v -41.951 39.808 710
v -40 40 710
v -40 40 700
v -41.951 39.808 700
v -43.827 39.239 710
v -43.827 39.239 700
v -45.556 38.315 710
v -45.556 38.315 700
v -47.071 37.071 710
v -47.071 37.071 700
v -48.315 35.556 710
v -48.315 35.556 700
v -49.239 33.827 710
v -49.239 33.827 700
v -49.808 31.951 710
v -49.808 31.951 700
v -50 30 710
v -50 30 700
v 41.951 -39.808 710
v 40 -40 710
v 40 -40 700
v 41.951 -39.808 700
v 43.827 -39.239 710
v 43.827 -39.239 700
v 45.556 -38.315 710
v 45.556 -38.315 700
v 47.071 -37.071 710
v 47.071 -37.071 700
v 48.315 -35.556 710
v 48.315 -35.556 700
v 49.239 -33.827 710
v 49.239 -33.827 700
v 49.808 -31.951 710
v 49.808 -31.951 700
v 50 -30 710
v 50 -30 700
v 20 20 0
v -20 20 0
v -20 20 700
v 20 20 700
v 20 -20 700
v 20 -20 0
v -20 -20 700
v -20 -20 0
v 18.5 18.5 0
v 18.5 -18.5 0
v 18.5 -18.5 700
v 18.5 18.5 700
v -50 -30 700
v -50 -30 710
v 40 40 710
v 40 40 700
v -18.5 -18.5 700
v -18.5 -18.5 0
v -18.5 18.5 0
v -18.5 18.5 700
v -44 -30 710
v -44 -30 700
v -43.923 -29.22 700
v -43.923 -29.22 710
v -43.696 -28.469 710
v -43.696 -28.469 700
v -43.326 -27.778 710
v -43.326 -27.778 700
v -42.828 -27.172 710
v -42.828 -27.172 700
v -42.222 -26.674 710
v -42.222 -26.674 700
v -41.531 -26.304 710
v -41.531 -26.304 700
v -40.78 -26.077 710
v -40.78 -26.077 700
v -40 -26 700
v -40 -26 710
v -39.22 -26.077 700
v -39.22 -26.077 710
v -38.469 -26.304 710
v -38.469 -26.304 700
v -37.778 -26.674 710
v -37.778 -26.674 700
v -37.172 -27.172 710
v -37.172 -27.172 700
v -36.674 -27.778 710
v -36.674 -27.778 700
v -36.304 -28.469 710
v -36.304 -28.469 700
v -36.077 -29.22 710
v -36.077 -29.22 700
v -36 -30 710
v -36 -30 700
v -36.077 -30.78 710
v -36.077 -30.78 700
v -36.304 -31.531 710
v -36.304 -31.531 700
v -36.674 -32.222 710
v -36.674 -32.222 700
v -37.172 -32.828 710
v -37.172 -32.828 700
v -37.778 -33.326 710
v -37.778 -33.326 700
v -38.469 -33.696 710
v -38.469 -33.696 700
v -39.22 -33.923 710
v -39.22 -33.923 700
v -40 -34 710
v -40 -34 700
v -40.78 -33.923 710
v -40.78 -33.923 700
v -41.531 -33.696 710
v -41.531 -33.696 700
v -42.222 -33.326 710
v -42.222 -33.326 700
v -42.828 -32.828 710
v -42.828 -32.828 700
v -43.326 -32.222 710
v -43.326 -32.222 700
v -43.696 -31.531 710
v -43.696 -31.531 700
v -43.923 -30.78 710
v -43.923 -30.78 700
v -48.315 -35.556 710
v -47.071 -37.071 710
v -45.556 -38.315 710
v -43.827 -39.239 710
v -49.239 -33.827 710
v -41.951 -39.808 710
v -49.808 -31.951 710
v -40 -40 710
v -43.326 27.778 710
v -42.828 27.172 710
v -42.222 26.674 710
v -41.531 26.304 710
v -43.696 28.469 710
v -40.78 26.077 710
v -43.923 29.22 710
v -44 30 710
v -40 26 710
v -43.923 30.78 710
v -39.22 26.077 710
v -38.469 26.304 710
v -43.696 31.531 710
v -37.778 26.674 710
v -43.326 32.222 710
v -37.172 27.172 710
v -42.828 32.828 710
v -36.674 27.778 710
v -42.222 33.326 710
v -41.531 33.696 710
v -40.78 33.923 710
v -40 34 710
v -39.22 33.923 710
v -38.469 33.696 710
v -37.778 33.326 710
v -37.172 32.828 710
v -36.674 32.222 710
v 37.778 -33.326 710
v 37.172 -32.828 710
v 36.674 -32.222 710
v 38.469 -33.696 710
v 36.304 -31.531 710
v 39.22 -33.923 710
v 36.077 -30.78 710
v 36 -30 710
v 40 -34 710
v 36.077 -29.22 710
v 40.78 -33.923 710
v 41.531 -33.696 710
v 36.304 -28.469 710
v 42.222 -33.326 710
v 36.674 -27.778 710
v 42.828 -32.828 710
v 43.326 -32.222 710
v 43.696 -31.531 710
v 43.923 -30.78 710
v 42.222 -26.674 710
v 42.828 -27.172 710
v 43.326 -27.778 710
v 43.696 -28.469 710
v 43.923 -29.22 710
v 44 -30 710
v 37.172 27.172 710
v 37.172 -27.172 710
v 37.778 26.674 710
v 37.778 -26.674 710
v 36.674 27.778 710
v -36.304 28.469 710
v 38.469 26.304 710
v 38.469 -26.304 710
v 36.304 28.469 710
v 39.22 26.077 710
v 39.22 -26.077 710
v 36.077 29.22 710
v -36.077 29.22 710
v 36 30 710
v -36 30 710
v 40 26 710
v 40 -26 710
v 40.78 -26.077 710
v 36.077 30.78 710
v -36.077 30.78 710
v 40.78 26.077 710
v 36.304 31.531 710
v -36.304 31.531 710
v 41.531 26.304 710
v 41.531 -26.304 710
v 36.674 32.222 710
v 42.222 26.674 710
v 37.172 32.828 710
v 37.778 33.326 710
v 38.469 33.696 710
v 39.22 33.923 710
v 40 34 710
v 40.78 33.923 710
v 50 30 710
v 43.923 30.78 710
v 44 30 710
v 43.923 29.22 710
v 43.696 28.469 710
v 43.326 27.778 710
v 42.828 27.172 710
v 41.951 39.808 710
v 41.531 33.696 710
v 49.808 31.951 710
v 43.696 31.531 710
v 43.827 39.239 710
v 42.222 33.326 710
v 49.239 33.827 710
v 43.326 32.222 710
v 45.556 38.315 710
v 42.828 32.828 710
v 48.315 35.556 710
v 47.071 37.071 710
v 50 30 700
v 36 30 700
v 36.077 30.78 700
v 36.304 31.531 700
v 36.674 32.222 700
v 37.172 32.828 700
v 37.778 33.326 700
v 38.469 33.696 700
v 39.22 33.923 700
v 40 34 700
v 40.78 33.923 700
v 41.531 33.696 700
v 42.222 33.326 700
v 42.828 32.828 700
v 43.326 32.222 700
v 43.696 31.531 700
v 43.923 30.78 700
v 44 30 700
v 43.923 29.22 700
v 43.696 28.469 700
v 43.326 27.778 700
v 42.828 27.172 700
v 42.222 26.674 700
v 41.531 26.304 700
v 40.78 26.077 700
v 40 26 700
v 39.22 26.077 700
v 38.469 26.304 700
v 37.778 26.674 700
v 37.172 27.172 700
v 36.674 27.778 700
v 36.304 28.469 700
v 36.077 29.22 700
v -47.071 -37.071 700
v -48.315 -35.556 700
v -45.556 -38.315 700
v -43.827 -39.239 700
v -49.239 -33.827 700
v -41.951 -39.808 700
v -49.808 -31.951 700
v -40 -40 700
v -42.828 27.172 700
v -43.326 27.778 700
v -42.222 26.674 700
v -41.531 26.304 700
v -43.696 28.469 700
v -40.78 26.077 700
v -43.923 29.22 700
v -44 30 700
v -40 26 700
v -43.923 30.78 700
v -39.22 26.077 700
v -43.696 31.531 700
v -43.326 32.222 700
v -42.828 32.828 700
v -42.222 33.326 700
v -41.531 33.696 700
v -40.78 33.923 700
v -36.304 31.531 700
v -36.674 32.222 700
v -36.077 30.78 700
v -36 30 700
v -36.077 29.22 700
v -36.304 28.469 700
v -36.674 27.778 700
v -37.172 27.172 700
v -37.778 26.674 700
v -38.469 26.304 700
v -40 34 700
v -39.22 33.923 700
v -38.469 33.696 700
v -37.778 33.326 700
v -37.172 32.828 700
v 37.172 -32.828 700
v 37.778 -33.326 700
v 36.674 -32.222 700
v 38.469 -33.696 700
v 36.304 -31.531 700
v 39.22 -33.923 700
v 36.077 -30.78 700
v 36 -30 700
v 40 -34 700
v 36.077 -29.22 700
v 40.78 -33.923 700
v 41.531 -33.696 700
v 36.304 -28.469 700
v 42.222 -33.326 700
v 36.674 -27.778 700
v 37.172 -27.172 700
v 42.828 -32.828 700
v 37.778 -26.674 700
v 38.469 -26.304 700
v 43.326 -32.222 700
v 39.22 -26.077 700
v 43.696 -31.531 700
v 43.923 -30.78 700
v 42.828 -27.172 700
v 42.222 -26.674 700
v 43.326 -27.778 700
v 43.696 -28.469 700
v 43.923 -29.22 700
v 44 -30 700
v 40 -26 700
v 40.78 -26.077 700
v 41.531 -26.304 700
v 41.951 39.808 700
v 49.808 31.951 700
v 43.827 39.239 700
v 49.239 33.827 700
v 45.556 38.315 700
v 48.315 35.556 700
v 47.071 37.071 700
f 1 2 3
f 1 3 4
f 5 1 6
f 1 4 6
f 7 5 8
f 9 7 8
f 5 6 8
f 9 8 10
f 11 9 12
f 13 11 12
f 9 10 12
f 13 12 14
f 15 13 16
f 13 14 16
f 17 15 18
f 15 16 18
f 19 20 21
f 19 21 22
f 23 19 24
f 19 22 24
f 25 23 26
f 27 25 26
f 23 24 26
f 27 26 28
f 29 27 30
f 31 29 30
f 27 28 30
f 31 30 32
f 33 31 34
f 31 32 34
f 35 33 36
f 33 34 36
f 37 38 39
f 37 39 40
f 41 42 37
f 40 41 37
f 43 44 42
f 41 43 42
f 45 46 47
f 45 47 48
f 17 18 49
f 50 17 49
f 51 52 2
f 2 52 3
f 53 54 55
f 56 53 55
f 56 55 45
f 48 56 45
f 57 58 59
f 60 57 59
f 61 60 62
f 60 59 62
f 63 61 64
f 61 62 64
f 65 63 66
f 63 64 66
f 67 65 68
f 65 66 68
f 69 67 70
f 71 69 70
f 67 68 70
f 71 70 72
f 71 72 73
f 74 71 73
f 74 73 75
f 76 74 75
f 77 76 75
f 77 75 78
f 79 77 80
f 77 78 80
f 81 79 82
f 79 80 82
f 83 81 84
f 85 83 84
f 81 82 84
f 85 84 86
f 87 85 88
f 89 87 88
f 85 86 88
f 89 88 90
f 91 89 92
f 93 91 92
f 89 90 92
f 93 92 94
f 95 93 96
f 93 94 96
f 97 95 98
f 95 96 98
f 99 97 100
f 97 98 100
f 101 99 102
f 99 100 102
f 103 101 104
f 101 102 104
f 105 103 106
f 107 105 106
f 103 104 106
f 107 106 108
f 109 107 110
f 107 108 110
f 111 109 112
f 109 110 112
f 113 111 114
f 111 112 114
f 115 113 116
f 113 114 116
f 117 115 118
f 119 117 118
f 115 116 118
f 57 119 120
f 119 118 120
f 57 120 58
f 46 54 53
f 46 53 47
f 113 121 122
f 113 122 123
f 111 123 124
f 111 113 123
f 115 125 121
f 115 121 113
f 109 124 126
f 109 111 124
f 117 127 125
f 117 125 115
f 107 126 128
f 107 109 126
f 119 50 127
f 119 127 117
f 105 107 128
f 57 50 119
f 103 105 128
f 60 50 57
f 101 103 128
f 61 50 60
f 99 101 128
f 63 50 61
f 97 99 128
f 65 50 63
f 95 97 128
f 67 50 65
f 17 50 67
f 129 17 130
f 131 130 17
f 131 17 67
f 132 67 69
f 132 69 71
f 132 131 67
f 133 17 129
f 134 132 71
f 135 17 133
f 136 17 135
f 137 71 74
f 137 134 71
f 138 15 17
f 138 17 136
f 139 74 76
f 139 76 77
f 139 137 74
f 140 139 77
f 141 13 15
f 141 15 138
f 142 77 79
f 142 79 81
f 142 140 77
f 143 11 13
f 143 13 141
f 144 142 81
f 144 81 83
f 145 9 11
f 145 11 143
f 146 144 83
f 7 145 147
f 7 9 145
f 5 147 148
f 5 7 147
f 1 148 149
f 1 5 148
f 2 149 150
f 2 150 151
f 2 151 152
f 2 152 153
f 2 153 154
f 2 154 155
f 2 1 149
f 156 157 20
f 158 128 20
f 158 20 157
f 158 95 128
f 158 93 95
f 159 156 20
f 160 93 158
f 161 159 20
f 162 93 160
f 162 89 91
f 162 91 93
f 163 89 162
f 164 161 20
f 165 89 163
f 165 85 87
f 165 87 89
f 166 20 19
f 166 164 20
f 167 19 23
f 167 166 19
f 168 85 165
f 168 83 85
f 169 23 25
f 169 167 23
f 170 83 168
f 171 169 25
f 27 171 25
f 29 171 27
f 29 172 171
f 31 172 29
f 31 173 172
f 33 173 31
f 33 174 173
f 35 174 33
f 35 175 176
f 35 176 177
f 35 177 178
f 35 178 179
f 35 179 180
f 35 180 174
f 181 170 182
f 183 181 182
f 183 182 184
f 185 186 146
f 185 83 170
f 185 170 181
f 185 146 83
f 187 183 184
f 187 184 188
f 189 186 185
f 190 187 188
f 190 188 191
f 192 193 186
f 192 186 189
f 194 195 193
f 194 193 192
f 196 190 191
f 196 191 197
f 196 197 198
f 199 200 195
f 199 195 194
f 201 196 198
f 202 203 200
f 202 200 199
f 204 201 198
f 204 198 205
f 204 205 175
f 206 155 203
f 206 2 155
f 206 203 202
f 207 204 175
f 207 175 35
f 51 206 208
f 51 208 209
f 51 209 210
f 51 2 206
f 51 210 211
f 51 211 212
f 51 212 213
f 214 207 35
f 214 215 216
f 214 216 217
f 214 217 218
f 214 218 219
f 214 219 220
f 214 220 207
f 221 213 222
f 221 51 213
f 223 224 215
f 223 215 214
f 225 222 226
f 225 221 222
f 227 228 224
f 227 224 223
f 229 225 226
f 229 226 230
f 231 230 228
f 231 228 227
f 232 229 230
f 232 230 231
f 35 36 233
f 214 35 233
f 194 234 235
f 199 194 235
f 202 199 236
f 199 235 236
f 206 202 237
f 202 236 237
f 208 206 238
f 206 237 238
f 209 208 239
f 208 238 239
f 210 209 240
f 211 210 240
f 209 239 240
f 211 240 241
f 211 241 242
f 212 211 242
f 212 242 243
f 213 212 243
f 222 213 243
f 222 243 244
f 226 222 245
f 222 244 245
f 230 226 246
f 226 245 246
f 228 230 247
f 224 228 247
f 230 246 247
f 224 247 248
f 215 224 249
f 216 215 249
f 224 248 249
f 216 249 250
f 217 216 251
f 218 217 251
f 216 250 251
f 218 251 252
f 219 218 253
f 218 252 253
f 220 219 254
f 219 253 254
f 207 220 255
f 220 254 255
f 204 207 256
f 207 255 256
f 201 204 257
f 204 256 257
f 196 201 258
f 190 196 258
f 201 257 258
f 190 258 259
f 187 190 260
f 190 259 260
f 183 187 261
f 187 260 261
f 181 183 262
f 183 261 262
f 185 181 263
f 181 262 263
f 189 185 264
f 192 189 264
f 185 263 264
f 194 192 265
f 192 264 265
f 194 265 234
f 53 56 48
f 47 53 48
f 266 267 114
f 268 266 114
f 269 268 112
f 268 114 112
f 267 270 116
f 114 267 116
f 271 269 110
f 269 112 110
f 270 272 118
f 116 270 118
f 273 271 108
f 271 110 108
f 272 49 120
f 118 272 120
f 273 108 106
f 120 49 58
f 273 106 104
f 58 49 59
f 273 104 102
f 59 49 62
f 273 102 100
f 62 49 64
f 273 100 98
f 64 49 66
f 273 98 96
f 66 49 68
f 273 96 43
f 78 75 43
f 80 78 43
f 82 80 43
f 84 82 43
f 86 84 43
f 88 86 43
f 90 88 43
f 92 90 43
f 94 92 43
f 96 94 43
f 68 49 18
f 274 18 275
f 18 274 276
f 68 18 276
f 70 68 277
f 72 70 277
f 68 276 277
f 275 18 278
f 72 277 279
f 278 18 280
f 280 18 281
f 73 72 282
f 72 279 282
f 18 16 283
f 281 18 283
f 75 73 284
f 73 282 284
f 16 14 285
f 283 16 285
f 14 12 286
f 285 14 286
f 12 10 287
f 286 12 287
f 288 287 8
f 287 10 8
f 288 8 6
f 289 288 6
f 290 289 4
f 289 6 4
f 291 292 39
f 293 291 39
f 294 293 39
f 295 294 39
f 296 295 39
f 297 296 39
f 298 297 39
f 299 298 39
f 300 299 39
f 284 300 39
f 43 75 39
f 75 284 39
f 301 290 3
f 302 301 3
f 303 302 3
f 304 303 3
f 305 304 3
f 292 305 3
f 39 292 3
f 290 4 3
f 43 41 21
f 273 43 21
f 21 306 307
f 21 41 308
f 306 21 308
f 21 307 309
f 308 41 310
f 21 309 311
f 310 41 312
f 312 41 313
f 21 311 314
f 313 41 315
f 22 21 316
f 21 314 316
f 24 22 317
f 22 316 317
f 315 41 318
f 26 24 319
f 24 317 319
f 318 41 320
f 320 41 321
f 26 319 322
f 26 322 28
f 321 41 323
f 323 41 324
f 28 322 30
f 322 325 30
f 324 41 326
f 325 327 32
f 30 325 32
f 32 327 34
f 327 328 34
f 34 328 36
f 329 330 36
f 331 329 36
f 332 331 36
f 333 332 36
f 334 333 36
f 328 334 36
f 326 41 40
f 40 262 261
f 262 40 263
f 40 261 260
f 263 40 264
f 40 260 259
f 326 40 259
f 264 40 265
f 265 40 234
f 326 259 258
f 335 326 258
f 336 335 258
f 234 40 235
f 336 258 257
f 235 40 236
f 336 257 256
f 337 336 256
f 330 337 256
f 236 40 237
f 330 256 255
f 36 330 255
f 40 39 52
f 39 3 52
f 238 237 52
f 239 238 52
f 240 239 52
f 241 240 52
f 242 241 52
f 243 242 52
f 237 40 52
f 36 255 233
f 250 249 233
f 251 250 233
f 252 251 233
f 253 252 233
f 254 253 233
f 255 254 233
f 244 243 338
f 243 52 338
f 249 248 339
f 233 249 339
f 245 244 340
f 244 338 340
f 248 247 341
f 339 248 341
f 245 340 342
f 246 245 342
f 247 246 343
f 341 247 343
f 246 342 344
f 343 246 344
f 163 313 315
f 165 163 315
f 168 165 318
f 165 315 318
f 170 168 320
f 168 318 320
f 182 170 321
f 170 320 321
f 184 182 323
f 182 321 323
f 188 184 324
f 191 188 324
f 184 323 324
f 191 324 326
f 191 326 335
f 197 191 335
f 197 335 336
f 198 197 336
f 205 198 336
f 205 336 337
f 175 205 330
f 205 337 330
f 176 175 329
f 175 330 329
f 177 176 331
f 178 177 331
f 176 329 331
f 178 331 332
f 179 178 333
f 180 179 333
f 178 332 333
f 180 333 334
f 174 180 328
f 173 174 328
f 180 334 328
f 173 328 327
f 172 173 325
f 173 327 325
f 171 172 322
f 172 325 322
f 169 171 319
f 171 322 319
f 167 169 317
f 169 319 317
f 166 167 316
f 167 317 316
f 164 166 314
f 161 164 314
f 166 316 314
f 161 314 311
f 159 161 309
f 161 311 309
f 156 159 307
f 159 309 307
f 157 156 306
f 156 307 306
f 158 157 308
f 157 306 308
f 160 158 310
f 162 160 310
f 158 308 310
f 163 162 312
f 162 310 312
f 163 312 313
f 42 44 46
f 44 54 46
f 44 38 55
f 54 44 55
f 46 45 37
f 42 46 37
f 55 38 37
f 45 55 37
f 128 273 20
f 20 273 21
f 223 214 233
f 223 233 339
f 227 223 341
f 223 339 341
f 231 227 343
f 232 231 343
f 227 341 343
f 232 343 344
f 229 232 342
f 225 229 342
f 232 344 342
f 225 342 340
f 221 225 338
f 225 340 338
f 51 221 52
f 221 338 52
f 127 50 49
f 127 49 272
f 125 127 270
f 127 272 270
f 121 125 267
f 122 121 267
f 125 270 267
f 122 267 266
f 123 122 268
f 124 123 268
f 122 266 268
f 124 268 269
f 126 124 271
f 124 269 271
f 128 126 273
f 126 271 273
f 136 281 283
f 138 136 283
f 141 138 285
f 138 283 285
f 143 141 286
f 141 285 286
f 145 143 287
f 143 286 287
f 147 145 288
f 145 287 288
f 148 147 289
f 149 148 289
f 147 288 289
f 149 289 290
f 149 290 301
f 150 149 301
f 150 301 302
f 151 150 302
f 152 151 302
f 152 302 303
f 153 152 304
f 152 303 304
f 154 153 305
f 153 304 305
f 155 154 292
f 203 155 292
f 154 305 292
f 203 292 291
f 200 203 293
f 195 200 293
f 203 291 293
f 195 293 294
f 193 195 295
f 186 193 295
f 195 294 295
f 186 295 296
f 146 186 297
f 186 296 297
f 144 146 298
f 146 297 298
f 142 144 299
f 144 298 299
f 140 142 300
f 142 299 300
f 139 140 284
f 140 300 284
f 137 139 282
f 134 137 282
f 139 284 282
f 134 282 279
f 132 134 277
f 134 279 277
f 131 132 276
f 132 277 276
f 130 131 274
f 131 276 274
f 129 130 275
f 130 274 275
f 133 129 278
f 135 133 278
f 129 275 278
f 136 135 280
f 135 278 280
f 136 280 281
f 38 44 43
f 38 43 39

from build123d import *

# Parameters (mm, degrees)
ESQUISSE1_W             = 40
ESQUISSE1_H             = 40
ESQUISSE1_W_2           = 37
ESQUISSE1_H_2           = 37
BOSS_EXTRU_1_DEPTH      = 700
BOSS_EXTRU_2_DEPTH      = 10
ESQUISSE3_R             = 4
ENL_V_MAT_EXTRU_1_DEPTH = 10


with BuildPart() as part:
    # Esquisse1 → Boss.-Extru.1 (new body)
    with BuildSketch(Plane.XY):
        Rectangle(ESQUISSE1_W, ESQUISSE1_H)
        Rectangle(ESQUISSE1_W_2, ESQUISSE1_H_2, mode=Mode.SUBTRACT)
    extrude(amount=BOSS_EXTRU_1_DEPTH)

    # Esquisse2 → Boss.-Extru.2 (add)
    with BuildSketch(Plane.XY.offset(700)):
        with BuildLine():
            Line((-40, -40), (40, -40))
            ThreePointArc((40, -40), (47.071067812, -37.071067812), (50, -30))
            Line((50, -30), (50, 30))
            ThreePointArc((50, 30), (47.071067812, 37.071067812), (40, 40))
            Line((40, 40), (-40, 40))
            ThreePointArc((-40, 40), (-47.071067812, 37.071067812), (-50, 30))
            Line((-50, 30), (-50, -30))
            ThreePointArc((-50, -30), (-47.071067812, -37.071067812), (-40, -40))
        make_face()
    extrude(amount=BOSS_EXTRU_2_DEPTH)

    # Esquisse3 → Enlèv. mat.-Extru.1 (cut)
    with BuildSketch(Plane(origin=(0, 0, 700), x_dir=(-1, 0, 0), z_dir=(0, 0, -1))):
        with Locations((40, 30)):
            Circle(ESQUISSE3_R)
        with Locations((-40, 30)):
            Circle(ESQUISSE3_R)
        with Locations((-40, -30)):
            Circle(ESQUISSE3_R)
        with Locations((40, -30)):
            Circle(ESQUISSE3_R)
    extrude(amount=-ENL_V_MAT_EXTRU_1_DEPTH, mode=Mode.SUBTRACT)


solid = part.part
